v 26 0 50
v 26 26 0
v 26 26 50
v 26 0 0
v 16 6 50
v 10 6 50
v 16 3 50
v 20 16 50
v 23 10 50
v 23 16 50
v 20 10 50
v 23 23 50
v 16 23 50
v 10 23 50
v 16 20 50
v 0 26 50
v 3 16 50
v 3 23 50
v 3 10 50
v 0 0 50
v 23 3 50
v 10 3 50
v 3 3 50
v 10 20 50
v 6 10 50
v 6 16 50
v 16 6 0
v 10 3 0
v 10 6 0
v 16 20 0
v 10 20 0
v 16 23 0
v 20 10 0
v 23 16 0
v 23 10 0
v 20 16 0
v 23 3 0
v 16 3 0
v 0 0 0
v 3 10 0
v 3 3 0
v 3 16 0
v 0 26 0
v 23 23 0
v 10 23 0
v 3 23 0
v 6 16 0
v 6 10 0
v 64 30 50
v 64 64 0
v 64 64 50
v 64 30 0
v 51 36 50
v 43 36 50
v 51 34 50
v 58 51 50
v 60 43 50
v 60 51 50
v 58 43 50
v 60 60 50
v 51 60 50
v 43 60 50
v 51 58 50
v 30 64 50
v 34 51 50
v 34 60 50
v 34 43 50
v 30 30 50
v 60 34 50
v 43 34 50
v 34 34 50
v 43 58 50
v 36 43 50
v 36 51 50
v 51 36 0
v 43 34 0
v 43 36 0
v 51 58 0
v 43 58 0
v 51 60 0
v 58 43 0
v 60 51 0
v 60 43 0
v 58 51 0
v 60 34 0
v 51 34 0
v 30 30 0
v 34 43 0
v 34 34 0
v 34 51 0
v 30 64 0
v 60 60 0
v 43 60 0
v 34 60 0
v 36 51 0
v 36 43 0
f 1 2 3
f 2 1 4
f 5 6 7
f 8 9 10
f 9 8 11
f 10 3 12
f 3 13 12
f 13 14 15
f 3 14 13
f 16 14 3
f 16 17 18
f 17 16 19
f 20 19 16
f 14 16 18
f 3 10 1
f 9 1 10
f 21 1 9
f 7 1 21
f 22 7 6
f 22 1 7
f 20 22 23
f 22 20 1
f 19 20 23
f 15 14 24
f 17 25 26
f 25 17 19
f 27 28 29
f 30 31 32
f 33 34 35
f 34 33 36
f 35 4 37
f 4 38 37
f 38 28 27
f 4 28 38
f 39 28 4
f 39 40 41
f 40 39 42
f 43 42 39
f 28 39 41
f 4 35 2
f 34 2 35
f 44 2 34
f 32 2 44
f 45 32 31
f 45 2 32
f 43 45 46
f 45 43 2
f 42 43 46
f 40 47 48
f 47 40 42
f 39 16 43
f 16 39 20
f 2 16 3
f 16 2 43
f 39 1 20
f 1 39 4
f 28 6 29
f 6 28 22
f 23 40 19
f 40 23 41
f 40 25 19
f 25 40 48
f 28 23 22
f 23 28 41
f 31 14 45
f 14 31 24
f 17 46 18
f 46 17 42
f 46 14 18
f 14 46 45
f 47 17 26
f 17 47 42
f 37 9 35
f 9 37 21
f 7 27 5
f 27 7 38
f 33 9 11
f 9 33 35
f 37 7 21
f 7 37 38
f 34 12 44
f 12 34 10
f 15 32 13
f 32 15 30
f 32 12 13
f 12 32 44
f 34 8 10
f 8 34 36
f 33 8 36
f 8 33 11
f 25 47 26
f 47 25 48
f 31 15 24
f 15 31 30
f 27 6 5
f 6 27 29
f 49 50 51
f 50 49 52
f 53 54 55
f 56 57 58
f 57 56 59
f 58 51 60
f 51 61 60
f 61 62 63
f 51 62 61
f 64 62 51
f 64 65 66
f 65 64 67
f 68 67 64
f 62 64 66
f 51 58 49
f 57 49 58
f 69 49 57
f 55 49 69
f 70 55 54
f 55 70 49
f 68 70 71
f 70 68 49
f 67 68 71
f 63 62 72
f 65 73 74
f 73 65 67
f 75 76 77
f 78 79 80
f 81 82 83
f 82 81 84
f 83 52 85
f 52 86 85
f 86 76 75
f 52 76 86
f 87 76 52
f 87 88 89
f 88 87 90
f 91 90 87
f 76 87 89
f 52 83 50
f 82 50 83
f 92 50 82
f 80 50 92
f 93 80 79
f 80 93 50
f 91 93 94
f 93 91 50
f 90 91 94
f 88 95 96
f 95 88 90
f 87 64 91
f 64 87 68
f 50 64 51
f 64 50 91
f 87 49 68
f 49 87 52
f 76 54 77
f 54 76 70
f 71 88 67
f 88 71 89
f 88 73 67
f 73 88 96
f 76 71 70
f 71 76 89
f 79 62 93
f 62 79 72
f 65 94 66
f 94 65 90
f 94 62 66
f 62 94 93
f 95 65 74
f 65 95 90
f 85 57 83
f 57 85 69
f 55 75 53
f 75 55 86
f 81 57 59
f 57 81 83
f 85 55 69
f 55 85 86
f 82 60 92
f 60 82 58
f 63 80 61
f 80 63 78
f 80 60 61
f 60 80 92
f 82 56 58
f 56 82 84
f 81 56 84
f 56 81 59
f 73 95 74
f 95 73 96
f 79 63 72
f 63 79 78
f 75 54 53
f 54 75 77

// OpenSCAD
$fa=0.5; // default minimum facet angle is now 0.5
$fs=0.5; // default minimum facet size is now 0.5 mm

module tube_profile_Z(x, y, z, longueur, epaisseur = 3, epaisseur_bloc = 3, largeur_bloc = 6, largeur_profile = 20)
{
    ecart = (largeur_profile - largeur_bloc)/2;
    
    difference()
    {
        translate([x,y,z])
        cube([largeur_profile+2*epaisseur, largeur_profile+2*epaisseur, longueur]);
        
        translate([x+epaisseur,y+epaisseur,z-1])
        #cube([ecart,ecart,longueur+2]);
        
        translate([x+epaisseur,y+epaisseur+ecart+largeur_bloc,z-1])
        #cube([ecart,ecart,longueur+2]);
        
        translate([x+epaisseur+ecart+largeur_bloc,y+epaisseur,z-1])
        #cube([ecart,ecart,longueur+2]);
        
        translate([x+epaisseur+ecart+largeur_bloc,y+epaisseur+ecart+largeur_bloc,z-1])
        #cube([ecart,ecart,longueur+2]);
        
        translate([x+epaisseur+epaisseur_bloc,y+epaisseur+epaisseur_bloc,z-1])
        #cube([largeur_profile-2*epaisseur_bloc,largeur_profile-2*epaisseur_bloc,longueur+2]);
    }
}

tube_profile_Z(0,0,0,50);
tube_profile_Z(x=30,y=30,z=0,longueur=50,epaisseur=4,epaisseur_bloc=2,largeur_bloc=8,largeur_profile=26);
